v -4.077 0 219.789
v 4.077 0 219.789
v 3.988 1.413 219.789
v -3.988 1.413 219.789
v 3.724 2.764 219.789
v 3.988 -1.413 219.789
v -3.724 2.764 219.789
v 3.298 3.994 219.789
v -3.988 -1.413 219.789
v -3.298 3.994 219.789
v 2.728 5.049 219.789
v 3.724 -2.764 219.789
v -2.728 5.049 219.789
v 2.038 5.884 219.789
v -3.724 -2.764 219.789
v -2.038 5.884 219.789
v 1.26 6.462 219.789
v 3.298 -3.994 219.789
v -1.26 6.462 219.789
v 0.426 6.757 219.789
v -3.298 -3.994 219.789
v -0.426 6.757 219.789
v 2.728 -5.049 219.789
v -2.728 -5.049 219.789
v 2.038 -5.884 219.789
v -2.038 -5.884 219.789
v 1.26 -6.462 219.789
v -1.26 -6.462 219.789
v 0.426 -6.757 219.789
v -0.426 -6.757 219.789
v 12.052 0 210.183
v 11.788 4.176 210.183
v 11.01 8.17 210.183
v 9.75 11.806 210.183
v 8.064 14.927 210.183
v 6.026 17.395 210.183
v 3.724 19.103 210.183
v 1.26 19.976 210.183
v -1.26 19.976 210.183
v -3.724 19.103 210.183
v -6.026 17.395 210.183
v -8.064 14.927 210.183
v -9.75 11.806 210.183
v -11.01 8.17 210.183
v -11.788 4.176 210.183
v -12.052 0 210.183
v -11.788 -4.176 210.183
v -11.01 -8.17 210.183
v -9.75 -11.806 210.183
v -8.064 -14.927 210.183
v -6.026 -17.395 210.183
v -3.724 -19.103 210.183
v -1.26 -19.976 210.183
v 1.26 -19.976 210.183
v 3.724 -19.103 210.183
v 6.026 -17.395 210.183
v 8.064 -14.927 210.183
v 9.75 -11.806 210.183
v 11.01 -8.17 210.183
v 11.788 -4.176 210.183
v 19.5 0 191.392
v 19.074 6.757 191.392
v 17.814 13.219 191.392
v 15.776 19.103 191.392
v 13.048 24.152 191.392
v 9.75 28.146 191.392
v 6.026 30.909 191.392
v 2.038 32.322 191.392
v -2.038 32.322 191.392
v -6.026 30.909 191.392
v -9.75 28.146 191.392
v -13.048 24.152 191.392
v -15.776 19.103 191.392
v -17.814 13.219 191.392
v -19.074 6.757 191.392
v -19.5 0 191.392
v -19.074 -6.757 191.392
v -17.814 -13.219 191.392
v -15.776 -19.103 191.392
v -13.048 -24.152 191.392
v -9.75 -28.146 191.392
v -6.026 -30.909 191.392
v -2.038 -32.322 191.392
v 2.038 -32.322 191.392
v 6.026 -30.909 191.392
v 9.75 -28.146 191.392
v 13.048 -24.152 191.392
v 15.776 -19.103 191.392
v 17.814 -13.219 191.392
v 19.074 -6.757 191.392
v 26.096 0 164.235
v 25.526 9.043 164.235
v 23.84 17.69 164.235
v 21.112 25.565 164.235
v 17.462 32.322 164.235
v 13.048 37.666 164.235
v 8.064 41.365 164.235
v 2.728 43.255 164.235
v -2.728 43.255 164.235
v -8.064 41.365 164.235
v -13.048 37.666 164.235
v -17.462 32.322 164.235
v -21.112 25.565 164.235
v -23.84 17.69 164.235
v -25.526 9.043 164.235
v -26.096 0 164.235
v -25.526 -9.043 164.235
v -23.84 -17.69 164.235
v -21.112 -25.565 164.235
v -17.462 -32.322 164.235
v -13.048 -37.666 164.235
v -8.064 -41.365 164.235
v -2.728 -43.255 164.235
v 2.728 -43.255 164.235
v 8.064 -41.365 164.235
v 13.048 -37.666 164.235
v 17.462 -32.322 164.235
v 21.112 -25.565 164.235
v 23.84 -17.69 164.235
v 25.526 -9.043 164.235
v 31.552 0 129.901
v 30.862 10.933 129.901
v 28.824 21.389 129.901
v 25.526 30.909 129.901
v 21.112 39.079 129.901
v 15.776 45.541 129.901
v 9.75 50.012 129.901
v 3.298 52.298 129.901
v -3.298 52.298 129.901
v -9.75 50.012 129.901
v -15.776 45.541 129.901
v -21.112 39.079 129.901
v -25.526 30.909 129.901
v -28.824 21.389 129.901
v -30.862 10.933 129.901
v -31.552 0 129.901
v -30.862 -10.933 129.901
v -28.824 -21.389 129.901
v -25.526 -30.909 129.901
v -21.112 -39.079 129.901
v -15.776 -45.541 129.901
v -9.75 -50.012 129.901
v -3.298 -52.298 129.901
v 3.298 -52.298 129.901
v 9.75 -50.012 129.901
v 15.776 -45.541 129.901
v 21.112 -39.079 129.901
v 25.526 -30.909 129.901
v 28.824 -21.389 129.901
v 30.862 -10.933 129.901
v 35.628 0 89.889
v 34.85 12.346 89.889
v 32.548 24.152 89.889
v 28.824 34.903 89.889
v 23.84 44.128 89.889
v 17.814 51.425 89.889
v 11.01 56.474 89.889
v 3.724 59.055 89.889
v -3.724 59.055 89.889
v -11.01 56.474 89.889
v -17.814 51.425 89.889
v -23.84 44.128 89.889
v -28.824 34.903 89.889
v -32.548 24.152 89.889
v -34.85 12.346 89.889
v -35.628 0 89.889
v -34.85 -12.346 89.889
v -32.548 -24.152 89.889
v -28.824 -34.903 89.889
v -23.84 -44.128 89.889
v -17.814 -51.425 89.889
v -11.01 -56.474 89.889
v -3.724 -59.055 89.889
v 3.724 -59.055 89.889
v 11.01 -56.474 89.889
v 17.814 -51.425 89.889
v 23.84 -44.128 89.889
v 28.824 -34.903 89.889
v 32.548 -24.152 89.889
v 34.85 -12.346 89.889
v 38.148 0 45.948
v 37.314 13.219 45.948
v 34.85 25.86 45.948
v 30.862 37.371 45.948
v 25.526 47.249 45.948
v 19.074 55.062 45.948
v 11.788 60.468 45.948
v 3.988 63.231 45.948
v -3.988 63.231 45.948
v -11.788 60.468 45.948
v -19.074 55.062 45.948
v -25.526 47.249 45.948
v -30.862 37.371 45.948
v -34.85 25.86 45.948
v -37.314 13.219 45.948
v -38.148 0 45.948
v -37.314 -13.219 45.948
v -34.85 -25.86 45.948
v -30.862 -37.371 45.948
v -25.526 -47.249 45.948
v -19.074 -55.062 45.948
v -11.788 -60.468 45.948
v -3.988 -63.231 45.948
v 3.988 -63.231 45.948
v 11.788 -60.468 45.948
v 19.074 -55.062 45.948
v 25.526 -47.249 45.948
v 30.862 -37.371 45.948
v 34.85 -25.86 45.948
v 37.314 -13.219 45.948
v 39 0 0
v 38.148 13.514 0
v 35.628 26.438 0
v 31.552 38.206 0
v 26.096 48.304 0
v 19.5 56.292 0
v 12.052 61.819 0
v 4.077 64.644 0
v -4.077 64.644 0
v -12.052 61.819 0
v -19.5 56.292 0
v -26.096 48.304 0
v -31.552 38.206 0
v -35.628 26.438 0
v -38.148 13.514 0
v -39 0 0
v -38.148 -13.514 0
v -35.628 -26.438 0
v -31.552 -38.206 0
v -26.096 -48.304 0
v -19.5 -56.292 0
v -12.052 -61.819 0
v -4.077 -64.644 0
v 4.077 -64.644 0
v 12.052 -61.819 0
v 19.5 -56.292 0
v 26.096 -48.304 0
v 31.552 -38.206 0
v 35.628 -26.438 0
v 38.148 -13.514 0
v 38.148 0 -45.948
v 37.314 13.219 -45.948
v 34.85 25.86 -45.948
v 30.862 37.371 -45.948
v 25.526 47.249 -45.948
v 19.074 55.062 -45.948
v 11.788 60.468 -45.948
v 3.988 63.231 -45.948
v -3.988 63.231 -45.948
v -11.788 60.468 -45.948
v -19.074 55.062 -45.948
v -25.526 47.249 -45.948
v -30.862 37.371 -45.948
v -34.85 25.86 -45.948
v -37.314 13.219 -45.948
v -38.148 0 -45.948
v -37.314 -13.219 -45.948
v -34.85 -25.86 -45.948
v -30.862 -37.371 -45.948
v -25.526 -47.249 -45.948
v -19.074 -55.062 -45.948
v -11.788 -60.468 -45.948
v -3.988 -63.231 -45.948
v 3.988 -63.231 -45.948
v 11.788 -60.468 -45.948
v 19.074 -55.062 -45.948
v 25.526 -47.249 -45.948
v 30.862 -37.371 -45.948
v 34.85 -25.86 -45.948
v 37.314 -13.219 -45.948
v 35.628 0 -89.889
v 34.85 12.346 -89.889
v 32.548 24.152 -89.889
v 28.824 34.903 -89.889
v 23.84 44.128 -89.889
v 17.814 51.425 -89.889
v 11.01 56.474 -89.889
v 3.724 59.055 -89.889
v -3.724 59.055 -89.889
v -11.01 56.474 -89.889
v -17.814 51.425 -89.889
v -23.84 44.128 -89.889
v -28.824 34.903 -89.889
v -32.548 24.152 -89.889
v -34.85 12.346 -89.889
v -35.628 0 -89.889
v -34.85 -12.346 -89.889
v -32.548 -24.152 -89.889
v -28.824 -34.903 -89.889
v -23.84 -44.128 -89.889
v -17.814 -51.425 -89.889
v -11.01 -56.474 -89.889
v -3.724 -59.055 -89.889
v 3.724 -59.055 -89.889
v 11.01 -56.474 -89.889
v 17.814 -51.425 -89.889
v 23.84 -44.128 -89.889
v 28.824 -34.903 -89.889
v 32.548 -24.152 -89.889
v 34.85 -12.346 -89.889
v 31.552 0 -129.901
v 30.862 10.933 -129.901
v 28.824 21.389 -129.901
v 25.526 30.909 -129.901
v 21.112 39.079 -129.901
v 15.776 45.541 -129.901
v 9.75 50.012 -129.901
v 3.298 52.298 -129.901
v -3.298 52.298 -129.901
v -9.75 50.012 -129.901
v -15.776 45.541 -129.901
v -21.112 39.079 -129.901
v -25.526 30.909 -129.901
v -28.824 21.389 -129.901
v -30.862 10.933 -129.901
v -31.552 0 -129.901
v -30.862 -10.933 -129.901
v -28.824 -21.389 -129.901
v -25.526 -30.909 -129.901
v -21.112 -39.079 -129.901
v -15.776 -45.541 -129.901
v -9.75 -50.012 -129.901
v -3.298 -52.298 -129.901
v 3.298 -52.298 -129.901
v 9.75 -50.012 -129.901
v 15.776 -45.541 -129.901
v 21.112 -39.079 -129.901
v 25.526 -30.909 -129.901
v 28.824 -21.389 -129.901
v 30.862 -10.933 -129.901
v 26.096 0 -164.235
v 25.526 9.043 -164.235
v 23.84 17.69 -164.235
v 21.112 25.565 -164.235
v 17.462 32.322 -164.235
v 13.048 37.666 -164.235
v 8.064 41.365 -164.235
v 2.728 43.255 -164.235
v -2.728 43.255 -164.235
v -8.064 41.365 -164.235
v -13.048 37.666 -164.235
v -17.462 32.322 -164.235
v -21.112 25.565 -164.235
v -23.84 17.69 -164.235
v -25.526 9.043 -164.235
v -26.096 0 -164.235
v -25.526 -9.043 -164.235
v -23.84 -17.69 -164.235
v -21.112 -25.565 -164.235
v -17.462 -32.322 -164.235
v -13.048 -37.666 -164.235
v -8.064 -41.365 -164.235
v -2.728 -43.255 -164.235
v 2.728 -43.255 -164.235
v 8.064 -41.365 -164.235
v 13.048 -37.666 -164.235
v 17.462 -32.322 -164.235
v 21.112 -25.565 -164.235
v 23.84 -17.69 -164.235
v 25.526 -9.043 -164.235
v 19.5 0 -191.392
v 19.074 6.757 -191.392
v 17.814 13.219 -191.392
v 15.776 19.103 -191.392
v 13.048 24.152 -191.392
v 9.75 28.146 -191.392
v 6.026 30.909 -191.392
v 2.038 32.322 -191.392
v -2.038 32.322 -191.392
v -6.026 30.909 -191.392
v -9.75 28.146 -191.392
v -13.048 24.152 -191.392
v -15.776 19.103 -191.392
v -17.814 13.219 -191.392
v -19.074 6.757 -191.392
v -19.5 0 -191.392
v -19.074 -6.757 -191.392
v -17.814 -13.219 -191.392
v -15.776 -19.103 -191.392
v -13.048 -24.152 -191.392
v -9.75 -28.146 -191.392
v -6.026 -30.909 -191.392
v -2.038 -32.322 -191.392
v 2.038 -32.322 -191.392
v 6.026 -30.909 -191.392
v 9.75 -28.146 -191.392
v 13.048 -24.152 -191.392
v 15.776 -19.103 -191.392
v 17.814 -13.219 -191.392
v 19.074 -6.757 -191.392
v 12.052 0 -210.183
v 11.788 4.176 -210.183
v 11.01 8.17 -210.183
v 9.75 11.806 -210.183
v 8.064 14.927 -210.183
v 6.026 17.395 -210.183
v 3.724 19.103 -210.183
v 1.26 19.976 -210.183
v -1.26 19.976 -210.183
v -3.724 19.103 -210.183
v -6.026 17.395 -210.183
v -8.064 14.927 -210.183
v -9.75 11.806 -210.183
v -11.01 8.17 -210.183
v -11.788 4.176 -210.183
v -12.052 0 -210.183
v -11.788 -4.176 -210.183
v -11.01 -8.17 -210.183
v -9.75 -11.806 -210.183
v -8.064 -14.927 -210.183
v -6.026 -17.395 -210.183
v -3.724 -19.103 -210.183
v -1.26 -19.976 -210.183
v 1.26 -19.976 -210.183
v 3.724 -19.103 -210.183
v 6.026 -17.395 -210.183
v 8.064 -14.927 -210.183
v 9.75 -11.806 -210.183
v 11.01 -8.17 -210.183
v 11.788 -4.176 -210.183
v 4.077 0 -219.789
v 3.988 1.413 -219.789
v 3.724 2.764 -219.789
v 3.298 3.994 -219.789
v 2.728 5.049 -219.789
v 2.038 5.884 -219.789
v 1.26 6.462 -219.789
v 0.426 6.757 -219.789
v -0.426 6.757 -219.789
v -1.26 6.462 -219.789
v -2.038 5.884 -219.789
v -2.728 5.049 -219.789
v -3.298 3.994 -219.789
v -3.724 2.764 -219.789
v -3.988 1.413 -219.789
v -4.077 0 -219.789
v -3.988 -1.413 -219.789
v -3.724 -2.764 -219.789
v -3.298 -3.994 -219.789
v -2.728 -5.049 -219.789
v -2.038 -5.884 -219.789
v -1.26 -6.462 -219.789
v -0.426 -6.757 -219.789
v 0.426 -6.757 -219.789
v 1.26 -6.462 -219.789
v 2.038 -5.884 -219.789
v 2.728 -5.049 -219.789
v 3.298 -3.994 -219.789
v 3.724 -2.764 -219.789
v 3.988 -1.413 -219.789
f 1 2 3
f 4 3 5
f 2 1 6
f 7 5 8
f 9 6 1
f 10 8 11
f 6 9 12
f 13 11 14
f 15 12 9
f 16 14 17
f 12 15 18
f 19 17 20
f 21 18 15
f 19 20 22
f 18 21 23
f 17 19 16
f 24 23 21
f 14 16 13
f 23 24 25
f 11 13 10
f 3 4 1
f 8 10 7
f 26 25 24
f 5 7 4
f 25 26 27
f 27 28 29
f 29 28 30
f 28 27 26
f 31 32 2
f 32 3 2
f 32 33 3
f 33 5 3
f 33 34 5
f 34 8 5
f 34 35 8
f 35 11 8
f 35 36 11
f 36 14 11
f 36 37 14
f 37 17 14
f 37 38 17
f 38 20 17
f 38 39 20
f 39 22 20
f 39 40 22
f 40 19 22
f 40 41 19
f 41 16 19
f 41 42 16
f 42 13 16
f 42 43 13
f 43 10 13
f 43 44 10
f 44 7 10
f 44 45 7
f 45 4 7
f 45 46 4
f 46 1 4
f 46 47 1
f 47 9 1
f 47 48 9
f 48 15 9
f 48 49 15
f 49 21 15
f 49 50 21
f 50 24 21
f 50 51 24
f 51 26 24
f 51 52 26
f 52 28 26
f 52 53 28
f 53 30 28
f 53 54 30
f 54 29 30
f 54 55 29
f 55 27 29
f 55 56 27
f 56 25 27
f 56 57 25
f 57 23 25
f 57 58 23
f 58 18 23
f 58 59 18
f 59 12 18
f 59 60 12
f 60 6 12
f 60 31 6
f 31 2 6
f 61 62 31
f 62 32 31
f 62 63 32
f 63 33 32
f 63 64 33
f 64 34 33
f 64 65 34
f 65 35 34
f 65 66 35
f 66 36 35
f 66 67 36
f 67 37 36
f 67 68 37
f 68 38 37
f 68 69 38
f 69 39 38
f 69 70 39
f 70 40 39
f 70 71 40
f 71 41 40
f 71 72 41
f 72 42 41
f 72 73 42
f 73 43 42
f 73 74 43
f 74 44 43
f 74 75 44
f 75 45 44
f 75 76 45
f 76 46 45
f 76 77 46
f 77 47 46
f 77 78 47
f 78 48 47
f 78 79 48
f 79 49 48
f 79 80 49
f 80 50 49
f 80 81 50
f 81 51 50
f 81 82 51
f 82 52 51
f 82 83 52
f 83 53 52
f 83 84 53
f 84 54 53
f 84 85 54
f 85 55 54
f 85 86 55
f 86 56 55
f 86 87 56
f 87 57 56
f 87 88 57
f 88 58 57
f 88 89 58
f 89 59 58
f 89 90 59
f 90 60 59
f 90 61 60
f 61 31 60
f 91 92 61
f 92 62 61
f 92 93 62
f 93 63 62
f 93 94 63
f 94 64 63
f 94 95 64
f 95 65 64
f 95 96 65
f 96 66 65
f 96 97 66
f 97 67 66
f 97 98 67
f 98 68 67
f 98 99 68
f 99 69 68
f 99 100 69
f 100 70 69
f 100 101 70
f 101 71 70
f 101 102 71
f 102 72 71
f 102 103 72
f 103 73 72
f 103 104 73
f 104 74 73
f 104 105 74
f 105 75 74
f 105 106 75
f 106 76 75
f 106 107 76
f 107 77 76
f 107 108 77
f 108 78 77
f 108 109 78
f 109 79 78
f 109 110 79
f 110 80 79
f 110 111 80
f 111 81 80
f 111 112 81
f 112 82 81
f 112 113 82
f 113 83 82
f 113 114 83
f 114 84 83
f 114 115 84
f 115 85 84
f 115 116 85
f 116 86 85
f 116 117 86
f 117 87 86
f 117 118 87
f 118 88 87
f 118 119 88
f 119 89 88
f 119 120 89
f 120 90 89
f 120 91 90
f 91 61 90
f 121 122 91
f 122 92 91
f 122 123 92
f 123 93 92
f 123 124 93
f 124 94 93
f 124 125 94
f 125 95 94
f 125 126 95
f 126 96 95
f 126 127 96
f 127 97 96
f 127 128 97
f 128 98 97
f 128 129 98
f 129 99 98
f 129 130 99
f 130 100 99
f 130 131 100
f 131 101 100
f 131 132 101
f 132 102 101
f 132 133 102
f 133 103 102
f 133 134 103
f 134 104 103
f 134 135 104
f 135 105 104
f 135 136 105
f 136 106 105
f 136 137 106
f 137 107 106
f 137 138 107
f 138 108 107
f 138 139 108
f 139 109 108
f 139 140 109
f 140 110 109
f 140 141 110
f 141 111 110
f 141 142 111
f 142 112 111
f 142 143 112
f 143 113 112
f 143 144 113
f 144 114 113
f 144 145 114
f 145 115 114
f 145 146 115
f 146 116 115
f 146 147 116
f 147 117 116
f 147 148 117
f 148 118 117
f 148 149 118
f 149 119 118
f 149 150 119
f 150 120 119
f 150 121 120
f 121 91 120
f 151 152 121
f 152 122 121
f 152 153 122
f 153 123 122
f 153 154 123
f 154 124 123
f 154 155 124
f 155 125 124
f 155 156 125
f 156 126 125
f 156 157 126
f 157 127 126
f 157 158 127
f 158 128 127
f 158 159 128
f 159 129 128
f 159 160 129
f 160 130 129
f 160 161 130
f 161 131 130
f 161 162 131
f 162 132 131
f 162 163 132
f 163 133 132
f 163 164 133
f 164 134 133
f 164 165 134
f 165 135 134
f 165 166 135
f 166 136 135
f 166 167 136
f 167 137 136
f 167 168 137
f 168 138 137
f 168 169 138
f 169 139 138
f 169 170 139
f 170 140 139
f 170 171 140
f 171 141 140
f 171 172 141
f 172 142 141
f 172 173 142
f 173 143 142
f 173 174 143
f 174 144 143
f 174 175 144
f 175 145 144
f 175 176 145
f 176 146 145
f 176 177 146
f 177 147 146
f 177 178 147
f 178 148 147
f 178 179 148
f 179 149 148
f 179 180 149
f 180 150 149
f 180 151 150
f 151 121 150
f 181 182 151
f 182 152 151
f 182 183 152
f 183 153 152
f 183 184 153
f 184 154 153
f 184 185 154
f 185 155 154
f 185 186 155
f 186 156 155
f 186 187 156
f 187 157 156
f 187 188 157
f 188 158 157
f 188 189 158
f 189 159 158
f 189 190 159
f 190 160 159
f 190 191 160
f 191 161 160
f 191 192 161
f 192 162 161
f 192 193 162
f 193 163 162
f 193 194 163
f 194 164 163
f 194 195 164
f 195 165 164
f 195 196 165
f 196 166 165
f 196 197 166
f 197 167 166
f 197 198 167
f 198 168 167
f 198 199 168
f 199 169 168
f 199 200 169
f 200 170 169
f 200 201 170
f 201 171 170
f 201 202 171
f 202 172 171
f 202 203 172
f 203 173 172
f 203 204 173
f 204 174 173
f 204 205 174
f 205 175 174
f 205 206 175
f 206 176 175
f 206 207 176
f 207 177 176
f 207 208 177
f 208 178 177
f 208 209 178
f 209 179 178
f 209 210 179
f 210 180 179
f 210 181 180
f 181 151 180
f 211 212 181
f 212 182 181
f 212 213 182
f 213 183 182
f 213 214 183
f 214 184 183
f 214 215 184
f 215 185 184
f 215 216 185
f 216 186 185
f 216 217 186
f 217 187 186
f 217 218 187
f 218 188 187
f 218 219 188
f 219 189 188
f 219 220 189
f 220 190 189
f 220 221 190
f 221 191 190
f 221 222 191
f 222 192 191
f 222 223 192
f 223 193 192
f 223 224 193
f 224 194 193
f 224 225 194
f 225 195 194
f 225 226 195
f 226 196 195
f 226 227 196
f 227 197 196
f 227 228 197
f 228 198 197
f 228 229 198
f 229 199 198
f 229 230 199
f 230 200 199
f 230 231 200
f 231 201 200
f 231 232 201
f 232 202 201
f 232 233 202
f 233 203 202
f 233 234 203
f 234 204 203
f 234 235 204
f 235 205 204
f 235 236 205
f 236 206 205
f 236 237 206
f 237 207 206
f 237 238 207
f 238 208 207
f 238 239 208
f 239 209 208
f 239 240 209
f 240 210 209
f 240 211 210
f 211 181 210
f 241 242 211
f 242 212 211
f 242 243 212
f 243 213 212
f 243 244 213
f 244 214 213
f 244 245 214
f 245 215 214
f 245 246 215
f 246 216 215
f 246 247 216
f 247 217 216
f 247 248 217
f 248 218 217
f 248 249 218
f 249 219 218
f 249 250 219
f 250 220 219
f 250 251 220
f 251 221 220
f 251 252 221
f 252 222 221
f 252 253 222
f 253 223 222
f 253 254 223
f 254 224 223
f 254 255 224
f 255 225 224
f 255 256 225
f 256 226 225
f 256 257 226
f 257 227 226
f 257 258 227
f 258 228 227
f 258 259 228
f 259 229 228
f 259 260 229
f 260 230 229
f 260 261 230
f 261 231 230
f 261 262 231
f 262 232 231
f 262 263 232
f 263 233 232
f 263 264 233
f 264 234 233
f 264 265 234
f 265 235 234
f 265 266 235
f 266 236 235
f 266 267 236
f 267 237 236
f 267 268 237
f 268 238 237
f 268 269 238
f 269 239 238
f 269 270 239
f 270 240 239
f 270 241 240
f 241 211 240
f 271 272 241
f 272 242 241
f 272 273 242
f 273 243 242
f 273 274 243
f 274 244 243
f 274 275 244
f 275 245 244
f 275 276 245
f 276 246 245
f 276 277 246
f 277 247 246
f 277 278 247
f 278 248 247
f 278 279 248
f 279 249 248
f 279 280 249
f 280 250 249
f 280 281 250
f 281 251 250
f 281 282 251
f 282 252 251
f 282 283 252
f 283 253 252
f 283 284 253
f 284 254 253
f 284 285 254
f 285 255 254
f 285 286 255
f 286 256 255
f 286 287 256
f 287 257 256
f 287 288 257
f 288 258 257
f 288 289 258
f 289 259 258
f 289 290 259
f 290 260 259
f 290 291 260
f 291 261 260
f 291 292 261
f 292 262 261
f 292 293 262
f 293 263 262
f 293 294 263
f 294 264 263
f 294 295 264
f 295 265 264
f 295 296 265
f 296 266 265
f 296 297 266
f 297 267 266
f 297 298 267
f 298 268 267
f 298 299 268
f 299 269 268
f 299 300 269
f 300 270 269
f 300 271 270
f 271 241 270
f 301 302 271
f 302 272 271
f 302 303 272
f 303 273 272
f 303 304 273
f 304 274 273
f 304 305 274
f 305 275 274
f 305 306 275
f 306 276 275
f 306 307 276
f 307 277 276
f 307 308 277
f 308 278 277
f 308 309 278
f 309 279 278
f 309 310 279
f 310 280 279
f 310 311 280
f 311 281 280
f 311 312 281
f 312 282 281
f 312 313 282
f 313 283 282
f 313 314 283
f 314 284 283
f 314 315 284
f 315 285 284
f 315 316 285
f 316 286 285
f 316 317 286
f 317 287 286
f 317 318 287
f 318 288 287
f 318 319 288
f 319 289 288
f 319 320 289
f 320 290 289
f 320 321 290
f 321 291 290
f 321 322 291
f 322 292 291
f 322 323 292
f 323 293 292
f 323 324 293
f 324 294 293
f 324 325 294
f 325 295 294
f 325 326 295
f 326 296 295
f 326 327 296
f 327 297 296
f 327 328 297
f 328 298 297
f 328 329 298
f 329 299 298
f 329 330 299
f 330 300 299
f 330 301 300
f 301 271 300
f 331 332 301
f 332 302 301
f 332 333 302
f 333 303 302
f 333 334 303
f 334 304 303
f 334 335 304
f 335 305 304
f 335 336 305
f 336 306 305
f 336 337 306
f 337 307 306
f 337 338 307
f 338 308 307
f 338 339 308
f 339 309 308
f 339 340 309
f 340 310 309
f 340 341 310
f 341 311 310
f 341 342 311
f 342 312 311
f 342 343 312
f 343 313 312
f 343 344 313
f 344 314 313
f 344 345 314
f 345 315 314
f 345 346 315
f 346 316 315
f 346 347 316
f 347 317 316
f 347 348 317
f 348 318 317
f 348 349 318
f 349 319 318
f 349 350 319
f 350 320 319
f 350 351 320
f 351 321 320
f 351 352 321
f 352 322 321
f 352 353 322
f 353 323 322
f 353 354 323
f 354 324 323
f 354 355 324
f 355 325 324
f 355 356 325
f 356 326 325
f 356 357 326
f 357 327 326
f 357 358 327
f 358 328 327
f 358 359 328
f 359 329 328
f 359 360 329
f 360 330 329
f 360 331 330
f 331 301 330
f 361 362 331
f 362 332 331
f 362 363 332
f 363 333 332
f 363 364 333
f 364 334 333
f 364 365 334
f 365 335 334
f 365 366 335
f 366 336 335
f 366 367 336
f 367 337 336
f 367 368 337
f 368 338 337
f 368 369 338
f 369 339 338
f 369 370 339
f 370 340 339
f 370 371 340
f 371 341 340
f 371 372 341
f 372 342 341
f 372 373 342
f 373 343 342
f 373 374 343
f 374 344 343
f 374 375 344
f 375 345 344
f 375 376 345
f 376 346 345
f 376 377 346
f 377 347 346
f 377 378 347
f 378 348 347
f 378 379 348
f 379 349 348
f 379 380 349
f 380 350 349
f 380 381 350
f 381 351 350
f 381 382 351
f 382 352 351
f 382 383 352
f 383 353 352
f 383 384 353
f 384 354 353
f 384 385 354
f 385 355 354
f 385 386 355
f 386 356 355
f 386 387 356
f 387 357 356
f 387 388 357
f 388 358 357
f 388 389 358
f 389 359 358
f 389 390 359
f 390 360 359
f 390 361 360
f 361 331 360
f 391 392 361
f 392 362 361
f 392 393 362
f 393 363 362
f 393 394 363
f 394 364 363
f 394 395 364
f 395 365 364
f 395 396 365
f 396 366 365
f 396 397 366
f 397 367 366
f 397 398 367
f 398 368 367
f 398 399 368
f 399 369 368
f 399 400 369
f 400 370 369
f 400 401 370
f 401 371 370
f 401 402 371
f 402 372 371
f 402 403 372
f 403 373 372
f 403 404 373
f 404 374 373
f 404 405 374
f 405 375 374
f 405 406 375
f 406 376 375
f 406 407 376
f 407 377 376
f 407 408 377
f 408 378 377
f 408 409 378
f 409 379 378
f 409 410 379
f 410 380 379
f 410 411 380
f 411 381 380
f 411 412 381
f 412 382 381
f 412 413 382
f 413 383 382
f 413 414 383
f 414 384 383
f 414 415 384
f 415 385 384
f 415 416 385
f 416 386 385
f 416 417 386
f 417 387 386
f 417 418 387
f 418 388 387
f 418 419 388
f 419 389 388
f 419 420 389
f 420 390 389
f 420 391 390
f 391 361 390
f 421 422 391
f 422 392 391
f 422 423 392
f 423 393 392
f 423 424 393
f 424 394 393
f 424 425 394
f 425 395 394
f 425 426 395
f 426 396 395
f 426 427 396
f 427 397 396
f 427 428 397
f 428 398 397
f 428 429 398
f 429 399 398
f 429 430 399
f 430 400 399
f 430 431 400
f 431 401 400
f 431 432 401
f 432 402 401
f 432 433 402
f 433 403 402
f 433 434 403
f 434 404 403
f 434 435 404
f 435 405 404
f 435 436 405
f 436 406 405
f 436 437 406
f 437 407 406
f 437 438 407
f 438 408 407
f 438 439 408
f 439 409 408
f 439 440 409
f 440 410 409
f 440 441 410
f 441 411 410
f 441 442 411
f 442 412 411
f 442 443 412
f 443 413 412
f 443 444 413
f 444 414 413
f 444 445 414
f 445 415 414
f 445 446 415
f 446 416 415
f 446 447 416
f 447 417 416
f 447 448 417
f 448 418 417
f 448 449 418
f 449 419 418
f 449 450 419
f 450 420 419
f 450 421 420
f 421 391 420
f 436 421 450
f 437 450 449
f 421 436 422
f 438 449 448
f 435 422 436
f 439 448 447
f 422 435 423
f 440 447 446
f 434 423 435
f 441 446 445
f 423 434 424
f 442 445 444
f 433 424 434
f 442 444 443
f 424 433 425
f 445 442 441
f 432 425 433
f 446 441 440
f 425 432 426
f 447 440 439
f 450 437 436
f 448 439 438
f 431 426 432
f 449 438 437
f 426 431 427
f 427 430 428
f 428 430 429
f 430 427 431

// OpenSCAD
// Generated by SolidPython 1.0.1 on 2020-07-29 00:46:45


scale(v = [3, 5, 17]) {
	sphere(r = 13);
}
/***********************************************
*********      SolidPython code:      **********
************************************************
 
# import packages: SolidPython
from solid import *
from solid.utils import *
from itertools import chain, combinations, permutations


class Resize:

    def __init__(self, scad_file):
        self.scad_file = scad_file
        #self.scad_file = import_scad(scad_file)
        # cone/cylinder param:
        self.r1 = 0
        self.r2 = 0
        self.h = 0
        # rectangular prism param:
        self.w = 0
        self.l = 0
        # ellipse param:
        self.r = 0

    # import OpenScad code (file name corresponds to shape)


    # classify shape + parameters
    def assign(self, param1, param2, param3):
        if self.scad_file == 'cone.scad':
            self.r1 = param1
            self.r2 = param2
            self.h = param3
        elif self.scad_file == 'cylinder.scad':
            self.r1 = param1
            self.r2 = param2
            self.h = param3
        elif self.scad_file == 'rectangularPrism.scad':
            self.h = param1
            self.l = param2
            self.w = param3
        else:
            self.r = param1
            self.h = param2

    # resize parameters
    def iterate(self):
        x = range(3, 20, 2)
        i = 1
        if self.scad_file == 'cone.scad':
            tempList = list(permutations(x, 2))
            for temp in tempList:
                param1 = temp[0]
                param2 = temp[1]
                filepath = 'produced_scad_files/' + 'cone' + str(param1) + '_' + str(param2) + '_' + '.scad'
                scad_render_to_file(cylinder(h=param1, r1=param2, r2=0), filepath)

        elif self.scad_file == 'cylinder.scad':
            tempList = list(permutations(x, 3))
            for temp in tempList:
                param1 = temp[0]
                param2 = temp[1]
                filepath = 'produced_scad_files/' + 'cylinder' + str(param1) + '_' + str(param2) + '_' + '.scad'
                scad_render_to_file(cylinder(h=param1, r1=param2, r2=param2), filepath)

        elif self.scad_file == 'rectangularPrism.scad':
            tempList = list(permutations(x, 3))
            for temp in tempList:
                param1 = temp[0]
                param2 = temp[1]
                param3 = temp[2]
                filepath = 'produced_scad_files/' + 'rectangularPrism' + str(param1) + '_' + str(param2) + '_' + str(
                    param3) + '.scad'
                scad_render_to_file(cube(size=(param1, param2, param3)), filepath)

        elif self.scad_file == 'ellipse.scad':
            tempList = list(permutations(x, 4))
            for temp in tempList:
                param1 = temp[0]
                param2 = temp[1]
                param3 = temp[2]
                param4 = temp[3]
                filepath = 'produced_scad_files/' + 'ellipse' + str(param1) + '_' + str(param2) + '_' + str(param3) + '_' + str(param4) + '.scad'
                scad_render_to_file(scale([param1, param2, param3])(sphere(r=param4)), filepath)

    def render_to_scadfile(self):
        scad_render_to_file(scad, 'example.scad') 
 
************************************************/
